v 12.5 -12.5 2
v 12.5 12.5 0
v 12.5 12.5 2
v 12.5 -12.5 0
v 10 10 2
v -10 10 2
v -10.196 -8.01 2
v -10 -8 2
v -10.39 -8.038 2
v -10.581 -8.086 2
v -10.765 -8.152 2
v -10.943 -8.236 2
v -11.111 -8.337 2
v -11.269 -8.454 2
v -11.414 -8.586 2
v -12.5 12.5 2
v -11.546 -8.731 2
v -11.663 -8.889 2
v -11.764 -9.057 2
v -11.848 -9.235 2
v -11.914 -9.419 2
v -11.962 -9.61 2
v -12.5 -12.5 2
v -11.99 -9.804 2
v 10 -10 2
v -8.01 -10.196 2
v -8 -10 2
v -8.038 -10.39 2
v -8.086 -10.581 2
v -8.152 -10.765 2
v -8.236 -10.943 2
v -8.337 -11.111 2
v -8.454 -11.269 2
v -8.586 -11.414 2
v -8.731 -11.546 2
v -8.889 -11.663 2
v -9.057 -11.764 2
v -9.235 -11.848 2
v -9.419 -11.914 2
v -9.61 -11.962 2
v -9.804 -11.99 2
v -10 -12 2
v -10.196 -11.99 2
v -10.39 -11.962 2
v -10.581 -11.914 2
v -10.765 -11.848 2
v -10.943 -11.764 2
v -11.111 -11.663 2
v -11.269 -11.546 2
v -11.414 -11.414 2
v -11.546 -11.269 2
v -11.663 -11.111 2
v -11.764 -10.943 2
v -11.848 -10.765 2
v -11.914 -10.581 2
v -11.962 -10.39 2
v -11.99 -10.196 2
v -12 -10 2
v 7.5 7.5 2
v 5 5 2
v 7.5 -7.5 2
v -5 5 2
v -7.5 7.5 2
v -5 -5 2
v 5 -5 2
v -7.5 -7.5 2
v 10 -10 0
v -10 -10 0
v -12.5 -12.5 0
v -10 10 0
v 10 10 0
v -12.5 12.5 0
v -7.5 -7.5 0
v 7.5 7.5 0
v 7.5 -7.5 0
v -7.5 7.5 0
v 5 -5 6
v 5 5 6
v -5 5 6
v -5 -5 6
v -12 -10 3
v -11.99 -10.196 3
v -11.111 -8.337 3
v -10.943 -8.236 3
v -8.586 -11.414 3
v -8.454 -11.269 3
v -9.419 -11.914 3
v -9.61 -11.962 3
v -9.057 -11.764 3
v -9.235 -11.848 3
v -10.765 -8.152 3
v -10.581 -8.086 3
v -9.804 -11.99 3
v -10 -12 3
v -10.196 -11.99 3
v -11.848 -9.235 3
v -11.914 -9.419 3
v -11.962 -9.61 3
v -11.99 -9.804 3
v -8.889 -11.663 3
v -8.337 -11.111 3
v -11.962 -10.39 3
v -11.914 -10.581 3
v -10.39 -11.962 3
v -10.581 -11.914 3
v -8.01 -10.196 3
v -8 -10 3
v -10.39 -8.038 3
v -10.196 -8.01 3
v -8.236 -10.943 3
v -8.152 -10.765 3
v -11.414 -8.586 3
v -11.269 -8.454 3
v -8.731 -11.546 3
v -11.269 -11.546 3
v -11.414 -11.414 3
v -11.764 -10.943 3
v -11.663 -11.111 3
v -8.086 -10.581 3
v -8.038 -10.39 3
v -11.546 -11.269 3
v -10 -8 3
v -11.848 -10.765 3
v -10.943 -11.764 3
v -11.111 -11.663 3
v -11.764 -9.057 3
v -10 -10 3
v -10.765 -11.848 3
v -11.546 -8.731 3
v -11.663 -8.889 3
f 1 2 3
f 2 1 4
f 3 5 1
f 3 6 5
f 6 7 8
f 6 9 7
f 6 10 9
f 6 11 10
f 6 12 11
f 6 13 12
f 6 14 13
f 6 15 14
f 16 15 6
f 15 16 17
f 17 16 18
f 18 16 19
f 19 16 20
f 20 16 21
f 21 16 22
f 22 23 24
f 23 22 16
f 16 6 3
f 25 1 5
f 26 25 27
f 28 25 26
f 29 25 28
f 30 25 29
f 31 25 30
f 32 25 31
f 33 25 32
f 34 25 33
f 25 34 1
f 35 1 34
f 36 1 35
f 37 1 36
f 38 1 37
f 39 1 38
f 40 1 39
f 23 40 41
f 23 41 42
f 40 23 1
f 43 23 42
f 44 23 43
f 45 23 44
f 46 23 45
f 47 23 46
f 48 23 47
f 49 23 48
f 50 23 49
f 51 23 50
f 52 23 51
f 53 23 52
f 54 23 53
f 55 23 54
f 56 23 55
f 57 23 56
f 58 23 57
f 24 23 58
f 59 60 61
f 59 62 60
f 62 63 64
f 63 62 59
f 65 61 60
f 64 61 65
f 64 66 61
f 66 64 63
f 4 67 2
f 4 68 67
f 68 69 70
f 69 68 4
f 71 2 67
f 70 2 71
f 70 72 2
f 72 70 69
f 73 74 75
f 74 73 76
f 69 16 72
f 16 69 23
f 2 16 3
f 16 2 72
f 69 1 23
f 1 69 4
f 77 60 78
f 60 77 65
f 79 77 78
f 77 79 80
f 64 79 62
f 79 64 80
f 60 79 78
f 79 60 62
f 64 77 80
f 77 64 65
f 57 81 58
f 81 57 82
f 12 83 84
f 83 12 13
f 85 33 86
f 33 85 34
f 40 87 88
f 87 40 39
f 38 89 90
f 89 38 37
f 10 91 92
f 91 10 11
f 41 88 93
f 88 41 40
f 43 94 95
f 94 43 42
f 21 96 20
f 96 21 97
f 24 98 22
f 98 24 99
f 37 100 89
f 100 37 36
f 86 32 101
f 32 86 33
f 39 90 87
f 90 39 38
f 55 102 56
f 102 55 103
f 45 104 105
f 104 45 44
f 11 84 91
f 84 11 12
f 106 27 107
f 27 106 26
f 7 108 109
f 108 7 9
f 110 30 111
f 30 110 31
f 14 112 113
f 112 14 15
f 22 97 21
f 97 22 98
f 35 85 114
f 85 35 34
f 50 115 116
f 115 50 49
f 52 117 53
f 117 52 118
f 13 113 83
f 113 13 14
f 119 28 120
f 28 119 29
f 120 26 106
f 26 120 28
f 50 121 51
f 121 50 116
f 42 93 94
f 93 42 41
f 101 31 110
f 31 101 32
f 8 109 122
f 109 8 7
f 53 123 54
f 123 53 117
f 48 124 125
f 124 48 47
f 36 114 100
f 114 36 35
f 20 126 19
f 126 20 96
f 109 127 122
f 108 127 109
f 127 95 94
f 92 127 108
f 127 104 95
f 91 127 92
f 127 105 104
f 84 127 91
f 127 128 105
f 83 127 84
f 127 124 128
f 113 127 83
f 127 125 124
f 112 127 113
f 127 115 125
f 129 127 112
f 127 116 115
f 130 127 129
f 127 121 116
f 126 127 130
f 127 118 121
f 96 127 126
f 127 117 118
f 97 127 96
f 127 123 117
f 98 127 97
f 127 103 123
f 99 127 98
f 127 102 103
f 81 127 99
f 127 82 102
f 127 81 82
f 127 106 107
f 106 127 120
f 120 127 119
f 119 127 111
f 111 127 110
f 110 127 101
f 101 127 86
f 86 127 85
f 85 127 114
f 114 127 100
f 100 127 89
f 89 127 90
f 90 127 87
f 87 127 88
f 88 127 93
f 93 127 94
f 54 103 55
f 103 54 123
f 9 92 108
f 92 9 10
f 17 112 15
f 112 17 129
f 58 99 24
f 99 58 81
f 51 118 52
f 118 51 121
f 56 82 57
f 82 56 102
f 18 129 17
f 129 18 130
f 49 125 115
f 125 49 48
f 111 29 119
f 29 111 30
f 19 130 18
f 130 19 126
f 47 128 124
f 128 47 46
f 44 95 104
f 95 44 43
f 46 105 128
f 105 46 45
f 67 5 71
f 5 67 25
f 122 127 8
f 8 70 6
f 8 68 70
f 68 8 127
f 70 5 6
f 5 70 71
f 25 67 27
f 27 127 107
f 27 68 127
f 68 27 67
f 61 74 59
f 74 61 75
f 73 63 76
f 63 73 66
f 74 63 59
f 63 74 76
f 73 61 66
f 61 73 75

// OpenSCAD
dual_box(01);

$fn=64;

module dual_box(nozzle = 0){
    if(nozzle >= 0){
        difference(){
            color([.8,.8,.8]) union(){
                translate([0,0,1]) cube([25,25,2], center=true);
                translate([0,0,3]) cube([10,10,6], center=true);
                translate([-10,-10,0]) cylinder(r=2, h=3);
            }
            dual_box(nozzle=-1);
        }
    }
    
    if(nozzle <= 0){
        color([.2,.2,.2]) difference(){
            translate([0,0,3]) cube([20,20,6], center=true);
            translate([0,0,3]) cube([15,15,8], center=true);
        }
    }
}
